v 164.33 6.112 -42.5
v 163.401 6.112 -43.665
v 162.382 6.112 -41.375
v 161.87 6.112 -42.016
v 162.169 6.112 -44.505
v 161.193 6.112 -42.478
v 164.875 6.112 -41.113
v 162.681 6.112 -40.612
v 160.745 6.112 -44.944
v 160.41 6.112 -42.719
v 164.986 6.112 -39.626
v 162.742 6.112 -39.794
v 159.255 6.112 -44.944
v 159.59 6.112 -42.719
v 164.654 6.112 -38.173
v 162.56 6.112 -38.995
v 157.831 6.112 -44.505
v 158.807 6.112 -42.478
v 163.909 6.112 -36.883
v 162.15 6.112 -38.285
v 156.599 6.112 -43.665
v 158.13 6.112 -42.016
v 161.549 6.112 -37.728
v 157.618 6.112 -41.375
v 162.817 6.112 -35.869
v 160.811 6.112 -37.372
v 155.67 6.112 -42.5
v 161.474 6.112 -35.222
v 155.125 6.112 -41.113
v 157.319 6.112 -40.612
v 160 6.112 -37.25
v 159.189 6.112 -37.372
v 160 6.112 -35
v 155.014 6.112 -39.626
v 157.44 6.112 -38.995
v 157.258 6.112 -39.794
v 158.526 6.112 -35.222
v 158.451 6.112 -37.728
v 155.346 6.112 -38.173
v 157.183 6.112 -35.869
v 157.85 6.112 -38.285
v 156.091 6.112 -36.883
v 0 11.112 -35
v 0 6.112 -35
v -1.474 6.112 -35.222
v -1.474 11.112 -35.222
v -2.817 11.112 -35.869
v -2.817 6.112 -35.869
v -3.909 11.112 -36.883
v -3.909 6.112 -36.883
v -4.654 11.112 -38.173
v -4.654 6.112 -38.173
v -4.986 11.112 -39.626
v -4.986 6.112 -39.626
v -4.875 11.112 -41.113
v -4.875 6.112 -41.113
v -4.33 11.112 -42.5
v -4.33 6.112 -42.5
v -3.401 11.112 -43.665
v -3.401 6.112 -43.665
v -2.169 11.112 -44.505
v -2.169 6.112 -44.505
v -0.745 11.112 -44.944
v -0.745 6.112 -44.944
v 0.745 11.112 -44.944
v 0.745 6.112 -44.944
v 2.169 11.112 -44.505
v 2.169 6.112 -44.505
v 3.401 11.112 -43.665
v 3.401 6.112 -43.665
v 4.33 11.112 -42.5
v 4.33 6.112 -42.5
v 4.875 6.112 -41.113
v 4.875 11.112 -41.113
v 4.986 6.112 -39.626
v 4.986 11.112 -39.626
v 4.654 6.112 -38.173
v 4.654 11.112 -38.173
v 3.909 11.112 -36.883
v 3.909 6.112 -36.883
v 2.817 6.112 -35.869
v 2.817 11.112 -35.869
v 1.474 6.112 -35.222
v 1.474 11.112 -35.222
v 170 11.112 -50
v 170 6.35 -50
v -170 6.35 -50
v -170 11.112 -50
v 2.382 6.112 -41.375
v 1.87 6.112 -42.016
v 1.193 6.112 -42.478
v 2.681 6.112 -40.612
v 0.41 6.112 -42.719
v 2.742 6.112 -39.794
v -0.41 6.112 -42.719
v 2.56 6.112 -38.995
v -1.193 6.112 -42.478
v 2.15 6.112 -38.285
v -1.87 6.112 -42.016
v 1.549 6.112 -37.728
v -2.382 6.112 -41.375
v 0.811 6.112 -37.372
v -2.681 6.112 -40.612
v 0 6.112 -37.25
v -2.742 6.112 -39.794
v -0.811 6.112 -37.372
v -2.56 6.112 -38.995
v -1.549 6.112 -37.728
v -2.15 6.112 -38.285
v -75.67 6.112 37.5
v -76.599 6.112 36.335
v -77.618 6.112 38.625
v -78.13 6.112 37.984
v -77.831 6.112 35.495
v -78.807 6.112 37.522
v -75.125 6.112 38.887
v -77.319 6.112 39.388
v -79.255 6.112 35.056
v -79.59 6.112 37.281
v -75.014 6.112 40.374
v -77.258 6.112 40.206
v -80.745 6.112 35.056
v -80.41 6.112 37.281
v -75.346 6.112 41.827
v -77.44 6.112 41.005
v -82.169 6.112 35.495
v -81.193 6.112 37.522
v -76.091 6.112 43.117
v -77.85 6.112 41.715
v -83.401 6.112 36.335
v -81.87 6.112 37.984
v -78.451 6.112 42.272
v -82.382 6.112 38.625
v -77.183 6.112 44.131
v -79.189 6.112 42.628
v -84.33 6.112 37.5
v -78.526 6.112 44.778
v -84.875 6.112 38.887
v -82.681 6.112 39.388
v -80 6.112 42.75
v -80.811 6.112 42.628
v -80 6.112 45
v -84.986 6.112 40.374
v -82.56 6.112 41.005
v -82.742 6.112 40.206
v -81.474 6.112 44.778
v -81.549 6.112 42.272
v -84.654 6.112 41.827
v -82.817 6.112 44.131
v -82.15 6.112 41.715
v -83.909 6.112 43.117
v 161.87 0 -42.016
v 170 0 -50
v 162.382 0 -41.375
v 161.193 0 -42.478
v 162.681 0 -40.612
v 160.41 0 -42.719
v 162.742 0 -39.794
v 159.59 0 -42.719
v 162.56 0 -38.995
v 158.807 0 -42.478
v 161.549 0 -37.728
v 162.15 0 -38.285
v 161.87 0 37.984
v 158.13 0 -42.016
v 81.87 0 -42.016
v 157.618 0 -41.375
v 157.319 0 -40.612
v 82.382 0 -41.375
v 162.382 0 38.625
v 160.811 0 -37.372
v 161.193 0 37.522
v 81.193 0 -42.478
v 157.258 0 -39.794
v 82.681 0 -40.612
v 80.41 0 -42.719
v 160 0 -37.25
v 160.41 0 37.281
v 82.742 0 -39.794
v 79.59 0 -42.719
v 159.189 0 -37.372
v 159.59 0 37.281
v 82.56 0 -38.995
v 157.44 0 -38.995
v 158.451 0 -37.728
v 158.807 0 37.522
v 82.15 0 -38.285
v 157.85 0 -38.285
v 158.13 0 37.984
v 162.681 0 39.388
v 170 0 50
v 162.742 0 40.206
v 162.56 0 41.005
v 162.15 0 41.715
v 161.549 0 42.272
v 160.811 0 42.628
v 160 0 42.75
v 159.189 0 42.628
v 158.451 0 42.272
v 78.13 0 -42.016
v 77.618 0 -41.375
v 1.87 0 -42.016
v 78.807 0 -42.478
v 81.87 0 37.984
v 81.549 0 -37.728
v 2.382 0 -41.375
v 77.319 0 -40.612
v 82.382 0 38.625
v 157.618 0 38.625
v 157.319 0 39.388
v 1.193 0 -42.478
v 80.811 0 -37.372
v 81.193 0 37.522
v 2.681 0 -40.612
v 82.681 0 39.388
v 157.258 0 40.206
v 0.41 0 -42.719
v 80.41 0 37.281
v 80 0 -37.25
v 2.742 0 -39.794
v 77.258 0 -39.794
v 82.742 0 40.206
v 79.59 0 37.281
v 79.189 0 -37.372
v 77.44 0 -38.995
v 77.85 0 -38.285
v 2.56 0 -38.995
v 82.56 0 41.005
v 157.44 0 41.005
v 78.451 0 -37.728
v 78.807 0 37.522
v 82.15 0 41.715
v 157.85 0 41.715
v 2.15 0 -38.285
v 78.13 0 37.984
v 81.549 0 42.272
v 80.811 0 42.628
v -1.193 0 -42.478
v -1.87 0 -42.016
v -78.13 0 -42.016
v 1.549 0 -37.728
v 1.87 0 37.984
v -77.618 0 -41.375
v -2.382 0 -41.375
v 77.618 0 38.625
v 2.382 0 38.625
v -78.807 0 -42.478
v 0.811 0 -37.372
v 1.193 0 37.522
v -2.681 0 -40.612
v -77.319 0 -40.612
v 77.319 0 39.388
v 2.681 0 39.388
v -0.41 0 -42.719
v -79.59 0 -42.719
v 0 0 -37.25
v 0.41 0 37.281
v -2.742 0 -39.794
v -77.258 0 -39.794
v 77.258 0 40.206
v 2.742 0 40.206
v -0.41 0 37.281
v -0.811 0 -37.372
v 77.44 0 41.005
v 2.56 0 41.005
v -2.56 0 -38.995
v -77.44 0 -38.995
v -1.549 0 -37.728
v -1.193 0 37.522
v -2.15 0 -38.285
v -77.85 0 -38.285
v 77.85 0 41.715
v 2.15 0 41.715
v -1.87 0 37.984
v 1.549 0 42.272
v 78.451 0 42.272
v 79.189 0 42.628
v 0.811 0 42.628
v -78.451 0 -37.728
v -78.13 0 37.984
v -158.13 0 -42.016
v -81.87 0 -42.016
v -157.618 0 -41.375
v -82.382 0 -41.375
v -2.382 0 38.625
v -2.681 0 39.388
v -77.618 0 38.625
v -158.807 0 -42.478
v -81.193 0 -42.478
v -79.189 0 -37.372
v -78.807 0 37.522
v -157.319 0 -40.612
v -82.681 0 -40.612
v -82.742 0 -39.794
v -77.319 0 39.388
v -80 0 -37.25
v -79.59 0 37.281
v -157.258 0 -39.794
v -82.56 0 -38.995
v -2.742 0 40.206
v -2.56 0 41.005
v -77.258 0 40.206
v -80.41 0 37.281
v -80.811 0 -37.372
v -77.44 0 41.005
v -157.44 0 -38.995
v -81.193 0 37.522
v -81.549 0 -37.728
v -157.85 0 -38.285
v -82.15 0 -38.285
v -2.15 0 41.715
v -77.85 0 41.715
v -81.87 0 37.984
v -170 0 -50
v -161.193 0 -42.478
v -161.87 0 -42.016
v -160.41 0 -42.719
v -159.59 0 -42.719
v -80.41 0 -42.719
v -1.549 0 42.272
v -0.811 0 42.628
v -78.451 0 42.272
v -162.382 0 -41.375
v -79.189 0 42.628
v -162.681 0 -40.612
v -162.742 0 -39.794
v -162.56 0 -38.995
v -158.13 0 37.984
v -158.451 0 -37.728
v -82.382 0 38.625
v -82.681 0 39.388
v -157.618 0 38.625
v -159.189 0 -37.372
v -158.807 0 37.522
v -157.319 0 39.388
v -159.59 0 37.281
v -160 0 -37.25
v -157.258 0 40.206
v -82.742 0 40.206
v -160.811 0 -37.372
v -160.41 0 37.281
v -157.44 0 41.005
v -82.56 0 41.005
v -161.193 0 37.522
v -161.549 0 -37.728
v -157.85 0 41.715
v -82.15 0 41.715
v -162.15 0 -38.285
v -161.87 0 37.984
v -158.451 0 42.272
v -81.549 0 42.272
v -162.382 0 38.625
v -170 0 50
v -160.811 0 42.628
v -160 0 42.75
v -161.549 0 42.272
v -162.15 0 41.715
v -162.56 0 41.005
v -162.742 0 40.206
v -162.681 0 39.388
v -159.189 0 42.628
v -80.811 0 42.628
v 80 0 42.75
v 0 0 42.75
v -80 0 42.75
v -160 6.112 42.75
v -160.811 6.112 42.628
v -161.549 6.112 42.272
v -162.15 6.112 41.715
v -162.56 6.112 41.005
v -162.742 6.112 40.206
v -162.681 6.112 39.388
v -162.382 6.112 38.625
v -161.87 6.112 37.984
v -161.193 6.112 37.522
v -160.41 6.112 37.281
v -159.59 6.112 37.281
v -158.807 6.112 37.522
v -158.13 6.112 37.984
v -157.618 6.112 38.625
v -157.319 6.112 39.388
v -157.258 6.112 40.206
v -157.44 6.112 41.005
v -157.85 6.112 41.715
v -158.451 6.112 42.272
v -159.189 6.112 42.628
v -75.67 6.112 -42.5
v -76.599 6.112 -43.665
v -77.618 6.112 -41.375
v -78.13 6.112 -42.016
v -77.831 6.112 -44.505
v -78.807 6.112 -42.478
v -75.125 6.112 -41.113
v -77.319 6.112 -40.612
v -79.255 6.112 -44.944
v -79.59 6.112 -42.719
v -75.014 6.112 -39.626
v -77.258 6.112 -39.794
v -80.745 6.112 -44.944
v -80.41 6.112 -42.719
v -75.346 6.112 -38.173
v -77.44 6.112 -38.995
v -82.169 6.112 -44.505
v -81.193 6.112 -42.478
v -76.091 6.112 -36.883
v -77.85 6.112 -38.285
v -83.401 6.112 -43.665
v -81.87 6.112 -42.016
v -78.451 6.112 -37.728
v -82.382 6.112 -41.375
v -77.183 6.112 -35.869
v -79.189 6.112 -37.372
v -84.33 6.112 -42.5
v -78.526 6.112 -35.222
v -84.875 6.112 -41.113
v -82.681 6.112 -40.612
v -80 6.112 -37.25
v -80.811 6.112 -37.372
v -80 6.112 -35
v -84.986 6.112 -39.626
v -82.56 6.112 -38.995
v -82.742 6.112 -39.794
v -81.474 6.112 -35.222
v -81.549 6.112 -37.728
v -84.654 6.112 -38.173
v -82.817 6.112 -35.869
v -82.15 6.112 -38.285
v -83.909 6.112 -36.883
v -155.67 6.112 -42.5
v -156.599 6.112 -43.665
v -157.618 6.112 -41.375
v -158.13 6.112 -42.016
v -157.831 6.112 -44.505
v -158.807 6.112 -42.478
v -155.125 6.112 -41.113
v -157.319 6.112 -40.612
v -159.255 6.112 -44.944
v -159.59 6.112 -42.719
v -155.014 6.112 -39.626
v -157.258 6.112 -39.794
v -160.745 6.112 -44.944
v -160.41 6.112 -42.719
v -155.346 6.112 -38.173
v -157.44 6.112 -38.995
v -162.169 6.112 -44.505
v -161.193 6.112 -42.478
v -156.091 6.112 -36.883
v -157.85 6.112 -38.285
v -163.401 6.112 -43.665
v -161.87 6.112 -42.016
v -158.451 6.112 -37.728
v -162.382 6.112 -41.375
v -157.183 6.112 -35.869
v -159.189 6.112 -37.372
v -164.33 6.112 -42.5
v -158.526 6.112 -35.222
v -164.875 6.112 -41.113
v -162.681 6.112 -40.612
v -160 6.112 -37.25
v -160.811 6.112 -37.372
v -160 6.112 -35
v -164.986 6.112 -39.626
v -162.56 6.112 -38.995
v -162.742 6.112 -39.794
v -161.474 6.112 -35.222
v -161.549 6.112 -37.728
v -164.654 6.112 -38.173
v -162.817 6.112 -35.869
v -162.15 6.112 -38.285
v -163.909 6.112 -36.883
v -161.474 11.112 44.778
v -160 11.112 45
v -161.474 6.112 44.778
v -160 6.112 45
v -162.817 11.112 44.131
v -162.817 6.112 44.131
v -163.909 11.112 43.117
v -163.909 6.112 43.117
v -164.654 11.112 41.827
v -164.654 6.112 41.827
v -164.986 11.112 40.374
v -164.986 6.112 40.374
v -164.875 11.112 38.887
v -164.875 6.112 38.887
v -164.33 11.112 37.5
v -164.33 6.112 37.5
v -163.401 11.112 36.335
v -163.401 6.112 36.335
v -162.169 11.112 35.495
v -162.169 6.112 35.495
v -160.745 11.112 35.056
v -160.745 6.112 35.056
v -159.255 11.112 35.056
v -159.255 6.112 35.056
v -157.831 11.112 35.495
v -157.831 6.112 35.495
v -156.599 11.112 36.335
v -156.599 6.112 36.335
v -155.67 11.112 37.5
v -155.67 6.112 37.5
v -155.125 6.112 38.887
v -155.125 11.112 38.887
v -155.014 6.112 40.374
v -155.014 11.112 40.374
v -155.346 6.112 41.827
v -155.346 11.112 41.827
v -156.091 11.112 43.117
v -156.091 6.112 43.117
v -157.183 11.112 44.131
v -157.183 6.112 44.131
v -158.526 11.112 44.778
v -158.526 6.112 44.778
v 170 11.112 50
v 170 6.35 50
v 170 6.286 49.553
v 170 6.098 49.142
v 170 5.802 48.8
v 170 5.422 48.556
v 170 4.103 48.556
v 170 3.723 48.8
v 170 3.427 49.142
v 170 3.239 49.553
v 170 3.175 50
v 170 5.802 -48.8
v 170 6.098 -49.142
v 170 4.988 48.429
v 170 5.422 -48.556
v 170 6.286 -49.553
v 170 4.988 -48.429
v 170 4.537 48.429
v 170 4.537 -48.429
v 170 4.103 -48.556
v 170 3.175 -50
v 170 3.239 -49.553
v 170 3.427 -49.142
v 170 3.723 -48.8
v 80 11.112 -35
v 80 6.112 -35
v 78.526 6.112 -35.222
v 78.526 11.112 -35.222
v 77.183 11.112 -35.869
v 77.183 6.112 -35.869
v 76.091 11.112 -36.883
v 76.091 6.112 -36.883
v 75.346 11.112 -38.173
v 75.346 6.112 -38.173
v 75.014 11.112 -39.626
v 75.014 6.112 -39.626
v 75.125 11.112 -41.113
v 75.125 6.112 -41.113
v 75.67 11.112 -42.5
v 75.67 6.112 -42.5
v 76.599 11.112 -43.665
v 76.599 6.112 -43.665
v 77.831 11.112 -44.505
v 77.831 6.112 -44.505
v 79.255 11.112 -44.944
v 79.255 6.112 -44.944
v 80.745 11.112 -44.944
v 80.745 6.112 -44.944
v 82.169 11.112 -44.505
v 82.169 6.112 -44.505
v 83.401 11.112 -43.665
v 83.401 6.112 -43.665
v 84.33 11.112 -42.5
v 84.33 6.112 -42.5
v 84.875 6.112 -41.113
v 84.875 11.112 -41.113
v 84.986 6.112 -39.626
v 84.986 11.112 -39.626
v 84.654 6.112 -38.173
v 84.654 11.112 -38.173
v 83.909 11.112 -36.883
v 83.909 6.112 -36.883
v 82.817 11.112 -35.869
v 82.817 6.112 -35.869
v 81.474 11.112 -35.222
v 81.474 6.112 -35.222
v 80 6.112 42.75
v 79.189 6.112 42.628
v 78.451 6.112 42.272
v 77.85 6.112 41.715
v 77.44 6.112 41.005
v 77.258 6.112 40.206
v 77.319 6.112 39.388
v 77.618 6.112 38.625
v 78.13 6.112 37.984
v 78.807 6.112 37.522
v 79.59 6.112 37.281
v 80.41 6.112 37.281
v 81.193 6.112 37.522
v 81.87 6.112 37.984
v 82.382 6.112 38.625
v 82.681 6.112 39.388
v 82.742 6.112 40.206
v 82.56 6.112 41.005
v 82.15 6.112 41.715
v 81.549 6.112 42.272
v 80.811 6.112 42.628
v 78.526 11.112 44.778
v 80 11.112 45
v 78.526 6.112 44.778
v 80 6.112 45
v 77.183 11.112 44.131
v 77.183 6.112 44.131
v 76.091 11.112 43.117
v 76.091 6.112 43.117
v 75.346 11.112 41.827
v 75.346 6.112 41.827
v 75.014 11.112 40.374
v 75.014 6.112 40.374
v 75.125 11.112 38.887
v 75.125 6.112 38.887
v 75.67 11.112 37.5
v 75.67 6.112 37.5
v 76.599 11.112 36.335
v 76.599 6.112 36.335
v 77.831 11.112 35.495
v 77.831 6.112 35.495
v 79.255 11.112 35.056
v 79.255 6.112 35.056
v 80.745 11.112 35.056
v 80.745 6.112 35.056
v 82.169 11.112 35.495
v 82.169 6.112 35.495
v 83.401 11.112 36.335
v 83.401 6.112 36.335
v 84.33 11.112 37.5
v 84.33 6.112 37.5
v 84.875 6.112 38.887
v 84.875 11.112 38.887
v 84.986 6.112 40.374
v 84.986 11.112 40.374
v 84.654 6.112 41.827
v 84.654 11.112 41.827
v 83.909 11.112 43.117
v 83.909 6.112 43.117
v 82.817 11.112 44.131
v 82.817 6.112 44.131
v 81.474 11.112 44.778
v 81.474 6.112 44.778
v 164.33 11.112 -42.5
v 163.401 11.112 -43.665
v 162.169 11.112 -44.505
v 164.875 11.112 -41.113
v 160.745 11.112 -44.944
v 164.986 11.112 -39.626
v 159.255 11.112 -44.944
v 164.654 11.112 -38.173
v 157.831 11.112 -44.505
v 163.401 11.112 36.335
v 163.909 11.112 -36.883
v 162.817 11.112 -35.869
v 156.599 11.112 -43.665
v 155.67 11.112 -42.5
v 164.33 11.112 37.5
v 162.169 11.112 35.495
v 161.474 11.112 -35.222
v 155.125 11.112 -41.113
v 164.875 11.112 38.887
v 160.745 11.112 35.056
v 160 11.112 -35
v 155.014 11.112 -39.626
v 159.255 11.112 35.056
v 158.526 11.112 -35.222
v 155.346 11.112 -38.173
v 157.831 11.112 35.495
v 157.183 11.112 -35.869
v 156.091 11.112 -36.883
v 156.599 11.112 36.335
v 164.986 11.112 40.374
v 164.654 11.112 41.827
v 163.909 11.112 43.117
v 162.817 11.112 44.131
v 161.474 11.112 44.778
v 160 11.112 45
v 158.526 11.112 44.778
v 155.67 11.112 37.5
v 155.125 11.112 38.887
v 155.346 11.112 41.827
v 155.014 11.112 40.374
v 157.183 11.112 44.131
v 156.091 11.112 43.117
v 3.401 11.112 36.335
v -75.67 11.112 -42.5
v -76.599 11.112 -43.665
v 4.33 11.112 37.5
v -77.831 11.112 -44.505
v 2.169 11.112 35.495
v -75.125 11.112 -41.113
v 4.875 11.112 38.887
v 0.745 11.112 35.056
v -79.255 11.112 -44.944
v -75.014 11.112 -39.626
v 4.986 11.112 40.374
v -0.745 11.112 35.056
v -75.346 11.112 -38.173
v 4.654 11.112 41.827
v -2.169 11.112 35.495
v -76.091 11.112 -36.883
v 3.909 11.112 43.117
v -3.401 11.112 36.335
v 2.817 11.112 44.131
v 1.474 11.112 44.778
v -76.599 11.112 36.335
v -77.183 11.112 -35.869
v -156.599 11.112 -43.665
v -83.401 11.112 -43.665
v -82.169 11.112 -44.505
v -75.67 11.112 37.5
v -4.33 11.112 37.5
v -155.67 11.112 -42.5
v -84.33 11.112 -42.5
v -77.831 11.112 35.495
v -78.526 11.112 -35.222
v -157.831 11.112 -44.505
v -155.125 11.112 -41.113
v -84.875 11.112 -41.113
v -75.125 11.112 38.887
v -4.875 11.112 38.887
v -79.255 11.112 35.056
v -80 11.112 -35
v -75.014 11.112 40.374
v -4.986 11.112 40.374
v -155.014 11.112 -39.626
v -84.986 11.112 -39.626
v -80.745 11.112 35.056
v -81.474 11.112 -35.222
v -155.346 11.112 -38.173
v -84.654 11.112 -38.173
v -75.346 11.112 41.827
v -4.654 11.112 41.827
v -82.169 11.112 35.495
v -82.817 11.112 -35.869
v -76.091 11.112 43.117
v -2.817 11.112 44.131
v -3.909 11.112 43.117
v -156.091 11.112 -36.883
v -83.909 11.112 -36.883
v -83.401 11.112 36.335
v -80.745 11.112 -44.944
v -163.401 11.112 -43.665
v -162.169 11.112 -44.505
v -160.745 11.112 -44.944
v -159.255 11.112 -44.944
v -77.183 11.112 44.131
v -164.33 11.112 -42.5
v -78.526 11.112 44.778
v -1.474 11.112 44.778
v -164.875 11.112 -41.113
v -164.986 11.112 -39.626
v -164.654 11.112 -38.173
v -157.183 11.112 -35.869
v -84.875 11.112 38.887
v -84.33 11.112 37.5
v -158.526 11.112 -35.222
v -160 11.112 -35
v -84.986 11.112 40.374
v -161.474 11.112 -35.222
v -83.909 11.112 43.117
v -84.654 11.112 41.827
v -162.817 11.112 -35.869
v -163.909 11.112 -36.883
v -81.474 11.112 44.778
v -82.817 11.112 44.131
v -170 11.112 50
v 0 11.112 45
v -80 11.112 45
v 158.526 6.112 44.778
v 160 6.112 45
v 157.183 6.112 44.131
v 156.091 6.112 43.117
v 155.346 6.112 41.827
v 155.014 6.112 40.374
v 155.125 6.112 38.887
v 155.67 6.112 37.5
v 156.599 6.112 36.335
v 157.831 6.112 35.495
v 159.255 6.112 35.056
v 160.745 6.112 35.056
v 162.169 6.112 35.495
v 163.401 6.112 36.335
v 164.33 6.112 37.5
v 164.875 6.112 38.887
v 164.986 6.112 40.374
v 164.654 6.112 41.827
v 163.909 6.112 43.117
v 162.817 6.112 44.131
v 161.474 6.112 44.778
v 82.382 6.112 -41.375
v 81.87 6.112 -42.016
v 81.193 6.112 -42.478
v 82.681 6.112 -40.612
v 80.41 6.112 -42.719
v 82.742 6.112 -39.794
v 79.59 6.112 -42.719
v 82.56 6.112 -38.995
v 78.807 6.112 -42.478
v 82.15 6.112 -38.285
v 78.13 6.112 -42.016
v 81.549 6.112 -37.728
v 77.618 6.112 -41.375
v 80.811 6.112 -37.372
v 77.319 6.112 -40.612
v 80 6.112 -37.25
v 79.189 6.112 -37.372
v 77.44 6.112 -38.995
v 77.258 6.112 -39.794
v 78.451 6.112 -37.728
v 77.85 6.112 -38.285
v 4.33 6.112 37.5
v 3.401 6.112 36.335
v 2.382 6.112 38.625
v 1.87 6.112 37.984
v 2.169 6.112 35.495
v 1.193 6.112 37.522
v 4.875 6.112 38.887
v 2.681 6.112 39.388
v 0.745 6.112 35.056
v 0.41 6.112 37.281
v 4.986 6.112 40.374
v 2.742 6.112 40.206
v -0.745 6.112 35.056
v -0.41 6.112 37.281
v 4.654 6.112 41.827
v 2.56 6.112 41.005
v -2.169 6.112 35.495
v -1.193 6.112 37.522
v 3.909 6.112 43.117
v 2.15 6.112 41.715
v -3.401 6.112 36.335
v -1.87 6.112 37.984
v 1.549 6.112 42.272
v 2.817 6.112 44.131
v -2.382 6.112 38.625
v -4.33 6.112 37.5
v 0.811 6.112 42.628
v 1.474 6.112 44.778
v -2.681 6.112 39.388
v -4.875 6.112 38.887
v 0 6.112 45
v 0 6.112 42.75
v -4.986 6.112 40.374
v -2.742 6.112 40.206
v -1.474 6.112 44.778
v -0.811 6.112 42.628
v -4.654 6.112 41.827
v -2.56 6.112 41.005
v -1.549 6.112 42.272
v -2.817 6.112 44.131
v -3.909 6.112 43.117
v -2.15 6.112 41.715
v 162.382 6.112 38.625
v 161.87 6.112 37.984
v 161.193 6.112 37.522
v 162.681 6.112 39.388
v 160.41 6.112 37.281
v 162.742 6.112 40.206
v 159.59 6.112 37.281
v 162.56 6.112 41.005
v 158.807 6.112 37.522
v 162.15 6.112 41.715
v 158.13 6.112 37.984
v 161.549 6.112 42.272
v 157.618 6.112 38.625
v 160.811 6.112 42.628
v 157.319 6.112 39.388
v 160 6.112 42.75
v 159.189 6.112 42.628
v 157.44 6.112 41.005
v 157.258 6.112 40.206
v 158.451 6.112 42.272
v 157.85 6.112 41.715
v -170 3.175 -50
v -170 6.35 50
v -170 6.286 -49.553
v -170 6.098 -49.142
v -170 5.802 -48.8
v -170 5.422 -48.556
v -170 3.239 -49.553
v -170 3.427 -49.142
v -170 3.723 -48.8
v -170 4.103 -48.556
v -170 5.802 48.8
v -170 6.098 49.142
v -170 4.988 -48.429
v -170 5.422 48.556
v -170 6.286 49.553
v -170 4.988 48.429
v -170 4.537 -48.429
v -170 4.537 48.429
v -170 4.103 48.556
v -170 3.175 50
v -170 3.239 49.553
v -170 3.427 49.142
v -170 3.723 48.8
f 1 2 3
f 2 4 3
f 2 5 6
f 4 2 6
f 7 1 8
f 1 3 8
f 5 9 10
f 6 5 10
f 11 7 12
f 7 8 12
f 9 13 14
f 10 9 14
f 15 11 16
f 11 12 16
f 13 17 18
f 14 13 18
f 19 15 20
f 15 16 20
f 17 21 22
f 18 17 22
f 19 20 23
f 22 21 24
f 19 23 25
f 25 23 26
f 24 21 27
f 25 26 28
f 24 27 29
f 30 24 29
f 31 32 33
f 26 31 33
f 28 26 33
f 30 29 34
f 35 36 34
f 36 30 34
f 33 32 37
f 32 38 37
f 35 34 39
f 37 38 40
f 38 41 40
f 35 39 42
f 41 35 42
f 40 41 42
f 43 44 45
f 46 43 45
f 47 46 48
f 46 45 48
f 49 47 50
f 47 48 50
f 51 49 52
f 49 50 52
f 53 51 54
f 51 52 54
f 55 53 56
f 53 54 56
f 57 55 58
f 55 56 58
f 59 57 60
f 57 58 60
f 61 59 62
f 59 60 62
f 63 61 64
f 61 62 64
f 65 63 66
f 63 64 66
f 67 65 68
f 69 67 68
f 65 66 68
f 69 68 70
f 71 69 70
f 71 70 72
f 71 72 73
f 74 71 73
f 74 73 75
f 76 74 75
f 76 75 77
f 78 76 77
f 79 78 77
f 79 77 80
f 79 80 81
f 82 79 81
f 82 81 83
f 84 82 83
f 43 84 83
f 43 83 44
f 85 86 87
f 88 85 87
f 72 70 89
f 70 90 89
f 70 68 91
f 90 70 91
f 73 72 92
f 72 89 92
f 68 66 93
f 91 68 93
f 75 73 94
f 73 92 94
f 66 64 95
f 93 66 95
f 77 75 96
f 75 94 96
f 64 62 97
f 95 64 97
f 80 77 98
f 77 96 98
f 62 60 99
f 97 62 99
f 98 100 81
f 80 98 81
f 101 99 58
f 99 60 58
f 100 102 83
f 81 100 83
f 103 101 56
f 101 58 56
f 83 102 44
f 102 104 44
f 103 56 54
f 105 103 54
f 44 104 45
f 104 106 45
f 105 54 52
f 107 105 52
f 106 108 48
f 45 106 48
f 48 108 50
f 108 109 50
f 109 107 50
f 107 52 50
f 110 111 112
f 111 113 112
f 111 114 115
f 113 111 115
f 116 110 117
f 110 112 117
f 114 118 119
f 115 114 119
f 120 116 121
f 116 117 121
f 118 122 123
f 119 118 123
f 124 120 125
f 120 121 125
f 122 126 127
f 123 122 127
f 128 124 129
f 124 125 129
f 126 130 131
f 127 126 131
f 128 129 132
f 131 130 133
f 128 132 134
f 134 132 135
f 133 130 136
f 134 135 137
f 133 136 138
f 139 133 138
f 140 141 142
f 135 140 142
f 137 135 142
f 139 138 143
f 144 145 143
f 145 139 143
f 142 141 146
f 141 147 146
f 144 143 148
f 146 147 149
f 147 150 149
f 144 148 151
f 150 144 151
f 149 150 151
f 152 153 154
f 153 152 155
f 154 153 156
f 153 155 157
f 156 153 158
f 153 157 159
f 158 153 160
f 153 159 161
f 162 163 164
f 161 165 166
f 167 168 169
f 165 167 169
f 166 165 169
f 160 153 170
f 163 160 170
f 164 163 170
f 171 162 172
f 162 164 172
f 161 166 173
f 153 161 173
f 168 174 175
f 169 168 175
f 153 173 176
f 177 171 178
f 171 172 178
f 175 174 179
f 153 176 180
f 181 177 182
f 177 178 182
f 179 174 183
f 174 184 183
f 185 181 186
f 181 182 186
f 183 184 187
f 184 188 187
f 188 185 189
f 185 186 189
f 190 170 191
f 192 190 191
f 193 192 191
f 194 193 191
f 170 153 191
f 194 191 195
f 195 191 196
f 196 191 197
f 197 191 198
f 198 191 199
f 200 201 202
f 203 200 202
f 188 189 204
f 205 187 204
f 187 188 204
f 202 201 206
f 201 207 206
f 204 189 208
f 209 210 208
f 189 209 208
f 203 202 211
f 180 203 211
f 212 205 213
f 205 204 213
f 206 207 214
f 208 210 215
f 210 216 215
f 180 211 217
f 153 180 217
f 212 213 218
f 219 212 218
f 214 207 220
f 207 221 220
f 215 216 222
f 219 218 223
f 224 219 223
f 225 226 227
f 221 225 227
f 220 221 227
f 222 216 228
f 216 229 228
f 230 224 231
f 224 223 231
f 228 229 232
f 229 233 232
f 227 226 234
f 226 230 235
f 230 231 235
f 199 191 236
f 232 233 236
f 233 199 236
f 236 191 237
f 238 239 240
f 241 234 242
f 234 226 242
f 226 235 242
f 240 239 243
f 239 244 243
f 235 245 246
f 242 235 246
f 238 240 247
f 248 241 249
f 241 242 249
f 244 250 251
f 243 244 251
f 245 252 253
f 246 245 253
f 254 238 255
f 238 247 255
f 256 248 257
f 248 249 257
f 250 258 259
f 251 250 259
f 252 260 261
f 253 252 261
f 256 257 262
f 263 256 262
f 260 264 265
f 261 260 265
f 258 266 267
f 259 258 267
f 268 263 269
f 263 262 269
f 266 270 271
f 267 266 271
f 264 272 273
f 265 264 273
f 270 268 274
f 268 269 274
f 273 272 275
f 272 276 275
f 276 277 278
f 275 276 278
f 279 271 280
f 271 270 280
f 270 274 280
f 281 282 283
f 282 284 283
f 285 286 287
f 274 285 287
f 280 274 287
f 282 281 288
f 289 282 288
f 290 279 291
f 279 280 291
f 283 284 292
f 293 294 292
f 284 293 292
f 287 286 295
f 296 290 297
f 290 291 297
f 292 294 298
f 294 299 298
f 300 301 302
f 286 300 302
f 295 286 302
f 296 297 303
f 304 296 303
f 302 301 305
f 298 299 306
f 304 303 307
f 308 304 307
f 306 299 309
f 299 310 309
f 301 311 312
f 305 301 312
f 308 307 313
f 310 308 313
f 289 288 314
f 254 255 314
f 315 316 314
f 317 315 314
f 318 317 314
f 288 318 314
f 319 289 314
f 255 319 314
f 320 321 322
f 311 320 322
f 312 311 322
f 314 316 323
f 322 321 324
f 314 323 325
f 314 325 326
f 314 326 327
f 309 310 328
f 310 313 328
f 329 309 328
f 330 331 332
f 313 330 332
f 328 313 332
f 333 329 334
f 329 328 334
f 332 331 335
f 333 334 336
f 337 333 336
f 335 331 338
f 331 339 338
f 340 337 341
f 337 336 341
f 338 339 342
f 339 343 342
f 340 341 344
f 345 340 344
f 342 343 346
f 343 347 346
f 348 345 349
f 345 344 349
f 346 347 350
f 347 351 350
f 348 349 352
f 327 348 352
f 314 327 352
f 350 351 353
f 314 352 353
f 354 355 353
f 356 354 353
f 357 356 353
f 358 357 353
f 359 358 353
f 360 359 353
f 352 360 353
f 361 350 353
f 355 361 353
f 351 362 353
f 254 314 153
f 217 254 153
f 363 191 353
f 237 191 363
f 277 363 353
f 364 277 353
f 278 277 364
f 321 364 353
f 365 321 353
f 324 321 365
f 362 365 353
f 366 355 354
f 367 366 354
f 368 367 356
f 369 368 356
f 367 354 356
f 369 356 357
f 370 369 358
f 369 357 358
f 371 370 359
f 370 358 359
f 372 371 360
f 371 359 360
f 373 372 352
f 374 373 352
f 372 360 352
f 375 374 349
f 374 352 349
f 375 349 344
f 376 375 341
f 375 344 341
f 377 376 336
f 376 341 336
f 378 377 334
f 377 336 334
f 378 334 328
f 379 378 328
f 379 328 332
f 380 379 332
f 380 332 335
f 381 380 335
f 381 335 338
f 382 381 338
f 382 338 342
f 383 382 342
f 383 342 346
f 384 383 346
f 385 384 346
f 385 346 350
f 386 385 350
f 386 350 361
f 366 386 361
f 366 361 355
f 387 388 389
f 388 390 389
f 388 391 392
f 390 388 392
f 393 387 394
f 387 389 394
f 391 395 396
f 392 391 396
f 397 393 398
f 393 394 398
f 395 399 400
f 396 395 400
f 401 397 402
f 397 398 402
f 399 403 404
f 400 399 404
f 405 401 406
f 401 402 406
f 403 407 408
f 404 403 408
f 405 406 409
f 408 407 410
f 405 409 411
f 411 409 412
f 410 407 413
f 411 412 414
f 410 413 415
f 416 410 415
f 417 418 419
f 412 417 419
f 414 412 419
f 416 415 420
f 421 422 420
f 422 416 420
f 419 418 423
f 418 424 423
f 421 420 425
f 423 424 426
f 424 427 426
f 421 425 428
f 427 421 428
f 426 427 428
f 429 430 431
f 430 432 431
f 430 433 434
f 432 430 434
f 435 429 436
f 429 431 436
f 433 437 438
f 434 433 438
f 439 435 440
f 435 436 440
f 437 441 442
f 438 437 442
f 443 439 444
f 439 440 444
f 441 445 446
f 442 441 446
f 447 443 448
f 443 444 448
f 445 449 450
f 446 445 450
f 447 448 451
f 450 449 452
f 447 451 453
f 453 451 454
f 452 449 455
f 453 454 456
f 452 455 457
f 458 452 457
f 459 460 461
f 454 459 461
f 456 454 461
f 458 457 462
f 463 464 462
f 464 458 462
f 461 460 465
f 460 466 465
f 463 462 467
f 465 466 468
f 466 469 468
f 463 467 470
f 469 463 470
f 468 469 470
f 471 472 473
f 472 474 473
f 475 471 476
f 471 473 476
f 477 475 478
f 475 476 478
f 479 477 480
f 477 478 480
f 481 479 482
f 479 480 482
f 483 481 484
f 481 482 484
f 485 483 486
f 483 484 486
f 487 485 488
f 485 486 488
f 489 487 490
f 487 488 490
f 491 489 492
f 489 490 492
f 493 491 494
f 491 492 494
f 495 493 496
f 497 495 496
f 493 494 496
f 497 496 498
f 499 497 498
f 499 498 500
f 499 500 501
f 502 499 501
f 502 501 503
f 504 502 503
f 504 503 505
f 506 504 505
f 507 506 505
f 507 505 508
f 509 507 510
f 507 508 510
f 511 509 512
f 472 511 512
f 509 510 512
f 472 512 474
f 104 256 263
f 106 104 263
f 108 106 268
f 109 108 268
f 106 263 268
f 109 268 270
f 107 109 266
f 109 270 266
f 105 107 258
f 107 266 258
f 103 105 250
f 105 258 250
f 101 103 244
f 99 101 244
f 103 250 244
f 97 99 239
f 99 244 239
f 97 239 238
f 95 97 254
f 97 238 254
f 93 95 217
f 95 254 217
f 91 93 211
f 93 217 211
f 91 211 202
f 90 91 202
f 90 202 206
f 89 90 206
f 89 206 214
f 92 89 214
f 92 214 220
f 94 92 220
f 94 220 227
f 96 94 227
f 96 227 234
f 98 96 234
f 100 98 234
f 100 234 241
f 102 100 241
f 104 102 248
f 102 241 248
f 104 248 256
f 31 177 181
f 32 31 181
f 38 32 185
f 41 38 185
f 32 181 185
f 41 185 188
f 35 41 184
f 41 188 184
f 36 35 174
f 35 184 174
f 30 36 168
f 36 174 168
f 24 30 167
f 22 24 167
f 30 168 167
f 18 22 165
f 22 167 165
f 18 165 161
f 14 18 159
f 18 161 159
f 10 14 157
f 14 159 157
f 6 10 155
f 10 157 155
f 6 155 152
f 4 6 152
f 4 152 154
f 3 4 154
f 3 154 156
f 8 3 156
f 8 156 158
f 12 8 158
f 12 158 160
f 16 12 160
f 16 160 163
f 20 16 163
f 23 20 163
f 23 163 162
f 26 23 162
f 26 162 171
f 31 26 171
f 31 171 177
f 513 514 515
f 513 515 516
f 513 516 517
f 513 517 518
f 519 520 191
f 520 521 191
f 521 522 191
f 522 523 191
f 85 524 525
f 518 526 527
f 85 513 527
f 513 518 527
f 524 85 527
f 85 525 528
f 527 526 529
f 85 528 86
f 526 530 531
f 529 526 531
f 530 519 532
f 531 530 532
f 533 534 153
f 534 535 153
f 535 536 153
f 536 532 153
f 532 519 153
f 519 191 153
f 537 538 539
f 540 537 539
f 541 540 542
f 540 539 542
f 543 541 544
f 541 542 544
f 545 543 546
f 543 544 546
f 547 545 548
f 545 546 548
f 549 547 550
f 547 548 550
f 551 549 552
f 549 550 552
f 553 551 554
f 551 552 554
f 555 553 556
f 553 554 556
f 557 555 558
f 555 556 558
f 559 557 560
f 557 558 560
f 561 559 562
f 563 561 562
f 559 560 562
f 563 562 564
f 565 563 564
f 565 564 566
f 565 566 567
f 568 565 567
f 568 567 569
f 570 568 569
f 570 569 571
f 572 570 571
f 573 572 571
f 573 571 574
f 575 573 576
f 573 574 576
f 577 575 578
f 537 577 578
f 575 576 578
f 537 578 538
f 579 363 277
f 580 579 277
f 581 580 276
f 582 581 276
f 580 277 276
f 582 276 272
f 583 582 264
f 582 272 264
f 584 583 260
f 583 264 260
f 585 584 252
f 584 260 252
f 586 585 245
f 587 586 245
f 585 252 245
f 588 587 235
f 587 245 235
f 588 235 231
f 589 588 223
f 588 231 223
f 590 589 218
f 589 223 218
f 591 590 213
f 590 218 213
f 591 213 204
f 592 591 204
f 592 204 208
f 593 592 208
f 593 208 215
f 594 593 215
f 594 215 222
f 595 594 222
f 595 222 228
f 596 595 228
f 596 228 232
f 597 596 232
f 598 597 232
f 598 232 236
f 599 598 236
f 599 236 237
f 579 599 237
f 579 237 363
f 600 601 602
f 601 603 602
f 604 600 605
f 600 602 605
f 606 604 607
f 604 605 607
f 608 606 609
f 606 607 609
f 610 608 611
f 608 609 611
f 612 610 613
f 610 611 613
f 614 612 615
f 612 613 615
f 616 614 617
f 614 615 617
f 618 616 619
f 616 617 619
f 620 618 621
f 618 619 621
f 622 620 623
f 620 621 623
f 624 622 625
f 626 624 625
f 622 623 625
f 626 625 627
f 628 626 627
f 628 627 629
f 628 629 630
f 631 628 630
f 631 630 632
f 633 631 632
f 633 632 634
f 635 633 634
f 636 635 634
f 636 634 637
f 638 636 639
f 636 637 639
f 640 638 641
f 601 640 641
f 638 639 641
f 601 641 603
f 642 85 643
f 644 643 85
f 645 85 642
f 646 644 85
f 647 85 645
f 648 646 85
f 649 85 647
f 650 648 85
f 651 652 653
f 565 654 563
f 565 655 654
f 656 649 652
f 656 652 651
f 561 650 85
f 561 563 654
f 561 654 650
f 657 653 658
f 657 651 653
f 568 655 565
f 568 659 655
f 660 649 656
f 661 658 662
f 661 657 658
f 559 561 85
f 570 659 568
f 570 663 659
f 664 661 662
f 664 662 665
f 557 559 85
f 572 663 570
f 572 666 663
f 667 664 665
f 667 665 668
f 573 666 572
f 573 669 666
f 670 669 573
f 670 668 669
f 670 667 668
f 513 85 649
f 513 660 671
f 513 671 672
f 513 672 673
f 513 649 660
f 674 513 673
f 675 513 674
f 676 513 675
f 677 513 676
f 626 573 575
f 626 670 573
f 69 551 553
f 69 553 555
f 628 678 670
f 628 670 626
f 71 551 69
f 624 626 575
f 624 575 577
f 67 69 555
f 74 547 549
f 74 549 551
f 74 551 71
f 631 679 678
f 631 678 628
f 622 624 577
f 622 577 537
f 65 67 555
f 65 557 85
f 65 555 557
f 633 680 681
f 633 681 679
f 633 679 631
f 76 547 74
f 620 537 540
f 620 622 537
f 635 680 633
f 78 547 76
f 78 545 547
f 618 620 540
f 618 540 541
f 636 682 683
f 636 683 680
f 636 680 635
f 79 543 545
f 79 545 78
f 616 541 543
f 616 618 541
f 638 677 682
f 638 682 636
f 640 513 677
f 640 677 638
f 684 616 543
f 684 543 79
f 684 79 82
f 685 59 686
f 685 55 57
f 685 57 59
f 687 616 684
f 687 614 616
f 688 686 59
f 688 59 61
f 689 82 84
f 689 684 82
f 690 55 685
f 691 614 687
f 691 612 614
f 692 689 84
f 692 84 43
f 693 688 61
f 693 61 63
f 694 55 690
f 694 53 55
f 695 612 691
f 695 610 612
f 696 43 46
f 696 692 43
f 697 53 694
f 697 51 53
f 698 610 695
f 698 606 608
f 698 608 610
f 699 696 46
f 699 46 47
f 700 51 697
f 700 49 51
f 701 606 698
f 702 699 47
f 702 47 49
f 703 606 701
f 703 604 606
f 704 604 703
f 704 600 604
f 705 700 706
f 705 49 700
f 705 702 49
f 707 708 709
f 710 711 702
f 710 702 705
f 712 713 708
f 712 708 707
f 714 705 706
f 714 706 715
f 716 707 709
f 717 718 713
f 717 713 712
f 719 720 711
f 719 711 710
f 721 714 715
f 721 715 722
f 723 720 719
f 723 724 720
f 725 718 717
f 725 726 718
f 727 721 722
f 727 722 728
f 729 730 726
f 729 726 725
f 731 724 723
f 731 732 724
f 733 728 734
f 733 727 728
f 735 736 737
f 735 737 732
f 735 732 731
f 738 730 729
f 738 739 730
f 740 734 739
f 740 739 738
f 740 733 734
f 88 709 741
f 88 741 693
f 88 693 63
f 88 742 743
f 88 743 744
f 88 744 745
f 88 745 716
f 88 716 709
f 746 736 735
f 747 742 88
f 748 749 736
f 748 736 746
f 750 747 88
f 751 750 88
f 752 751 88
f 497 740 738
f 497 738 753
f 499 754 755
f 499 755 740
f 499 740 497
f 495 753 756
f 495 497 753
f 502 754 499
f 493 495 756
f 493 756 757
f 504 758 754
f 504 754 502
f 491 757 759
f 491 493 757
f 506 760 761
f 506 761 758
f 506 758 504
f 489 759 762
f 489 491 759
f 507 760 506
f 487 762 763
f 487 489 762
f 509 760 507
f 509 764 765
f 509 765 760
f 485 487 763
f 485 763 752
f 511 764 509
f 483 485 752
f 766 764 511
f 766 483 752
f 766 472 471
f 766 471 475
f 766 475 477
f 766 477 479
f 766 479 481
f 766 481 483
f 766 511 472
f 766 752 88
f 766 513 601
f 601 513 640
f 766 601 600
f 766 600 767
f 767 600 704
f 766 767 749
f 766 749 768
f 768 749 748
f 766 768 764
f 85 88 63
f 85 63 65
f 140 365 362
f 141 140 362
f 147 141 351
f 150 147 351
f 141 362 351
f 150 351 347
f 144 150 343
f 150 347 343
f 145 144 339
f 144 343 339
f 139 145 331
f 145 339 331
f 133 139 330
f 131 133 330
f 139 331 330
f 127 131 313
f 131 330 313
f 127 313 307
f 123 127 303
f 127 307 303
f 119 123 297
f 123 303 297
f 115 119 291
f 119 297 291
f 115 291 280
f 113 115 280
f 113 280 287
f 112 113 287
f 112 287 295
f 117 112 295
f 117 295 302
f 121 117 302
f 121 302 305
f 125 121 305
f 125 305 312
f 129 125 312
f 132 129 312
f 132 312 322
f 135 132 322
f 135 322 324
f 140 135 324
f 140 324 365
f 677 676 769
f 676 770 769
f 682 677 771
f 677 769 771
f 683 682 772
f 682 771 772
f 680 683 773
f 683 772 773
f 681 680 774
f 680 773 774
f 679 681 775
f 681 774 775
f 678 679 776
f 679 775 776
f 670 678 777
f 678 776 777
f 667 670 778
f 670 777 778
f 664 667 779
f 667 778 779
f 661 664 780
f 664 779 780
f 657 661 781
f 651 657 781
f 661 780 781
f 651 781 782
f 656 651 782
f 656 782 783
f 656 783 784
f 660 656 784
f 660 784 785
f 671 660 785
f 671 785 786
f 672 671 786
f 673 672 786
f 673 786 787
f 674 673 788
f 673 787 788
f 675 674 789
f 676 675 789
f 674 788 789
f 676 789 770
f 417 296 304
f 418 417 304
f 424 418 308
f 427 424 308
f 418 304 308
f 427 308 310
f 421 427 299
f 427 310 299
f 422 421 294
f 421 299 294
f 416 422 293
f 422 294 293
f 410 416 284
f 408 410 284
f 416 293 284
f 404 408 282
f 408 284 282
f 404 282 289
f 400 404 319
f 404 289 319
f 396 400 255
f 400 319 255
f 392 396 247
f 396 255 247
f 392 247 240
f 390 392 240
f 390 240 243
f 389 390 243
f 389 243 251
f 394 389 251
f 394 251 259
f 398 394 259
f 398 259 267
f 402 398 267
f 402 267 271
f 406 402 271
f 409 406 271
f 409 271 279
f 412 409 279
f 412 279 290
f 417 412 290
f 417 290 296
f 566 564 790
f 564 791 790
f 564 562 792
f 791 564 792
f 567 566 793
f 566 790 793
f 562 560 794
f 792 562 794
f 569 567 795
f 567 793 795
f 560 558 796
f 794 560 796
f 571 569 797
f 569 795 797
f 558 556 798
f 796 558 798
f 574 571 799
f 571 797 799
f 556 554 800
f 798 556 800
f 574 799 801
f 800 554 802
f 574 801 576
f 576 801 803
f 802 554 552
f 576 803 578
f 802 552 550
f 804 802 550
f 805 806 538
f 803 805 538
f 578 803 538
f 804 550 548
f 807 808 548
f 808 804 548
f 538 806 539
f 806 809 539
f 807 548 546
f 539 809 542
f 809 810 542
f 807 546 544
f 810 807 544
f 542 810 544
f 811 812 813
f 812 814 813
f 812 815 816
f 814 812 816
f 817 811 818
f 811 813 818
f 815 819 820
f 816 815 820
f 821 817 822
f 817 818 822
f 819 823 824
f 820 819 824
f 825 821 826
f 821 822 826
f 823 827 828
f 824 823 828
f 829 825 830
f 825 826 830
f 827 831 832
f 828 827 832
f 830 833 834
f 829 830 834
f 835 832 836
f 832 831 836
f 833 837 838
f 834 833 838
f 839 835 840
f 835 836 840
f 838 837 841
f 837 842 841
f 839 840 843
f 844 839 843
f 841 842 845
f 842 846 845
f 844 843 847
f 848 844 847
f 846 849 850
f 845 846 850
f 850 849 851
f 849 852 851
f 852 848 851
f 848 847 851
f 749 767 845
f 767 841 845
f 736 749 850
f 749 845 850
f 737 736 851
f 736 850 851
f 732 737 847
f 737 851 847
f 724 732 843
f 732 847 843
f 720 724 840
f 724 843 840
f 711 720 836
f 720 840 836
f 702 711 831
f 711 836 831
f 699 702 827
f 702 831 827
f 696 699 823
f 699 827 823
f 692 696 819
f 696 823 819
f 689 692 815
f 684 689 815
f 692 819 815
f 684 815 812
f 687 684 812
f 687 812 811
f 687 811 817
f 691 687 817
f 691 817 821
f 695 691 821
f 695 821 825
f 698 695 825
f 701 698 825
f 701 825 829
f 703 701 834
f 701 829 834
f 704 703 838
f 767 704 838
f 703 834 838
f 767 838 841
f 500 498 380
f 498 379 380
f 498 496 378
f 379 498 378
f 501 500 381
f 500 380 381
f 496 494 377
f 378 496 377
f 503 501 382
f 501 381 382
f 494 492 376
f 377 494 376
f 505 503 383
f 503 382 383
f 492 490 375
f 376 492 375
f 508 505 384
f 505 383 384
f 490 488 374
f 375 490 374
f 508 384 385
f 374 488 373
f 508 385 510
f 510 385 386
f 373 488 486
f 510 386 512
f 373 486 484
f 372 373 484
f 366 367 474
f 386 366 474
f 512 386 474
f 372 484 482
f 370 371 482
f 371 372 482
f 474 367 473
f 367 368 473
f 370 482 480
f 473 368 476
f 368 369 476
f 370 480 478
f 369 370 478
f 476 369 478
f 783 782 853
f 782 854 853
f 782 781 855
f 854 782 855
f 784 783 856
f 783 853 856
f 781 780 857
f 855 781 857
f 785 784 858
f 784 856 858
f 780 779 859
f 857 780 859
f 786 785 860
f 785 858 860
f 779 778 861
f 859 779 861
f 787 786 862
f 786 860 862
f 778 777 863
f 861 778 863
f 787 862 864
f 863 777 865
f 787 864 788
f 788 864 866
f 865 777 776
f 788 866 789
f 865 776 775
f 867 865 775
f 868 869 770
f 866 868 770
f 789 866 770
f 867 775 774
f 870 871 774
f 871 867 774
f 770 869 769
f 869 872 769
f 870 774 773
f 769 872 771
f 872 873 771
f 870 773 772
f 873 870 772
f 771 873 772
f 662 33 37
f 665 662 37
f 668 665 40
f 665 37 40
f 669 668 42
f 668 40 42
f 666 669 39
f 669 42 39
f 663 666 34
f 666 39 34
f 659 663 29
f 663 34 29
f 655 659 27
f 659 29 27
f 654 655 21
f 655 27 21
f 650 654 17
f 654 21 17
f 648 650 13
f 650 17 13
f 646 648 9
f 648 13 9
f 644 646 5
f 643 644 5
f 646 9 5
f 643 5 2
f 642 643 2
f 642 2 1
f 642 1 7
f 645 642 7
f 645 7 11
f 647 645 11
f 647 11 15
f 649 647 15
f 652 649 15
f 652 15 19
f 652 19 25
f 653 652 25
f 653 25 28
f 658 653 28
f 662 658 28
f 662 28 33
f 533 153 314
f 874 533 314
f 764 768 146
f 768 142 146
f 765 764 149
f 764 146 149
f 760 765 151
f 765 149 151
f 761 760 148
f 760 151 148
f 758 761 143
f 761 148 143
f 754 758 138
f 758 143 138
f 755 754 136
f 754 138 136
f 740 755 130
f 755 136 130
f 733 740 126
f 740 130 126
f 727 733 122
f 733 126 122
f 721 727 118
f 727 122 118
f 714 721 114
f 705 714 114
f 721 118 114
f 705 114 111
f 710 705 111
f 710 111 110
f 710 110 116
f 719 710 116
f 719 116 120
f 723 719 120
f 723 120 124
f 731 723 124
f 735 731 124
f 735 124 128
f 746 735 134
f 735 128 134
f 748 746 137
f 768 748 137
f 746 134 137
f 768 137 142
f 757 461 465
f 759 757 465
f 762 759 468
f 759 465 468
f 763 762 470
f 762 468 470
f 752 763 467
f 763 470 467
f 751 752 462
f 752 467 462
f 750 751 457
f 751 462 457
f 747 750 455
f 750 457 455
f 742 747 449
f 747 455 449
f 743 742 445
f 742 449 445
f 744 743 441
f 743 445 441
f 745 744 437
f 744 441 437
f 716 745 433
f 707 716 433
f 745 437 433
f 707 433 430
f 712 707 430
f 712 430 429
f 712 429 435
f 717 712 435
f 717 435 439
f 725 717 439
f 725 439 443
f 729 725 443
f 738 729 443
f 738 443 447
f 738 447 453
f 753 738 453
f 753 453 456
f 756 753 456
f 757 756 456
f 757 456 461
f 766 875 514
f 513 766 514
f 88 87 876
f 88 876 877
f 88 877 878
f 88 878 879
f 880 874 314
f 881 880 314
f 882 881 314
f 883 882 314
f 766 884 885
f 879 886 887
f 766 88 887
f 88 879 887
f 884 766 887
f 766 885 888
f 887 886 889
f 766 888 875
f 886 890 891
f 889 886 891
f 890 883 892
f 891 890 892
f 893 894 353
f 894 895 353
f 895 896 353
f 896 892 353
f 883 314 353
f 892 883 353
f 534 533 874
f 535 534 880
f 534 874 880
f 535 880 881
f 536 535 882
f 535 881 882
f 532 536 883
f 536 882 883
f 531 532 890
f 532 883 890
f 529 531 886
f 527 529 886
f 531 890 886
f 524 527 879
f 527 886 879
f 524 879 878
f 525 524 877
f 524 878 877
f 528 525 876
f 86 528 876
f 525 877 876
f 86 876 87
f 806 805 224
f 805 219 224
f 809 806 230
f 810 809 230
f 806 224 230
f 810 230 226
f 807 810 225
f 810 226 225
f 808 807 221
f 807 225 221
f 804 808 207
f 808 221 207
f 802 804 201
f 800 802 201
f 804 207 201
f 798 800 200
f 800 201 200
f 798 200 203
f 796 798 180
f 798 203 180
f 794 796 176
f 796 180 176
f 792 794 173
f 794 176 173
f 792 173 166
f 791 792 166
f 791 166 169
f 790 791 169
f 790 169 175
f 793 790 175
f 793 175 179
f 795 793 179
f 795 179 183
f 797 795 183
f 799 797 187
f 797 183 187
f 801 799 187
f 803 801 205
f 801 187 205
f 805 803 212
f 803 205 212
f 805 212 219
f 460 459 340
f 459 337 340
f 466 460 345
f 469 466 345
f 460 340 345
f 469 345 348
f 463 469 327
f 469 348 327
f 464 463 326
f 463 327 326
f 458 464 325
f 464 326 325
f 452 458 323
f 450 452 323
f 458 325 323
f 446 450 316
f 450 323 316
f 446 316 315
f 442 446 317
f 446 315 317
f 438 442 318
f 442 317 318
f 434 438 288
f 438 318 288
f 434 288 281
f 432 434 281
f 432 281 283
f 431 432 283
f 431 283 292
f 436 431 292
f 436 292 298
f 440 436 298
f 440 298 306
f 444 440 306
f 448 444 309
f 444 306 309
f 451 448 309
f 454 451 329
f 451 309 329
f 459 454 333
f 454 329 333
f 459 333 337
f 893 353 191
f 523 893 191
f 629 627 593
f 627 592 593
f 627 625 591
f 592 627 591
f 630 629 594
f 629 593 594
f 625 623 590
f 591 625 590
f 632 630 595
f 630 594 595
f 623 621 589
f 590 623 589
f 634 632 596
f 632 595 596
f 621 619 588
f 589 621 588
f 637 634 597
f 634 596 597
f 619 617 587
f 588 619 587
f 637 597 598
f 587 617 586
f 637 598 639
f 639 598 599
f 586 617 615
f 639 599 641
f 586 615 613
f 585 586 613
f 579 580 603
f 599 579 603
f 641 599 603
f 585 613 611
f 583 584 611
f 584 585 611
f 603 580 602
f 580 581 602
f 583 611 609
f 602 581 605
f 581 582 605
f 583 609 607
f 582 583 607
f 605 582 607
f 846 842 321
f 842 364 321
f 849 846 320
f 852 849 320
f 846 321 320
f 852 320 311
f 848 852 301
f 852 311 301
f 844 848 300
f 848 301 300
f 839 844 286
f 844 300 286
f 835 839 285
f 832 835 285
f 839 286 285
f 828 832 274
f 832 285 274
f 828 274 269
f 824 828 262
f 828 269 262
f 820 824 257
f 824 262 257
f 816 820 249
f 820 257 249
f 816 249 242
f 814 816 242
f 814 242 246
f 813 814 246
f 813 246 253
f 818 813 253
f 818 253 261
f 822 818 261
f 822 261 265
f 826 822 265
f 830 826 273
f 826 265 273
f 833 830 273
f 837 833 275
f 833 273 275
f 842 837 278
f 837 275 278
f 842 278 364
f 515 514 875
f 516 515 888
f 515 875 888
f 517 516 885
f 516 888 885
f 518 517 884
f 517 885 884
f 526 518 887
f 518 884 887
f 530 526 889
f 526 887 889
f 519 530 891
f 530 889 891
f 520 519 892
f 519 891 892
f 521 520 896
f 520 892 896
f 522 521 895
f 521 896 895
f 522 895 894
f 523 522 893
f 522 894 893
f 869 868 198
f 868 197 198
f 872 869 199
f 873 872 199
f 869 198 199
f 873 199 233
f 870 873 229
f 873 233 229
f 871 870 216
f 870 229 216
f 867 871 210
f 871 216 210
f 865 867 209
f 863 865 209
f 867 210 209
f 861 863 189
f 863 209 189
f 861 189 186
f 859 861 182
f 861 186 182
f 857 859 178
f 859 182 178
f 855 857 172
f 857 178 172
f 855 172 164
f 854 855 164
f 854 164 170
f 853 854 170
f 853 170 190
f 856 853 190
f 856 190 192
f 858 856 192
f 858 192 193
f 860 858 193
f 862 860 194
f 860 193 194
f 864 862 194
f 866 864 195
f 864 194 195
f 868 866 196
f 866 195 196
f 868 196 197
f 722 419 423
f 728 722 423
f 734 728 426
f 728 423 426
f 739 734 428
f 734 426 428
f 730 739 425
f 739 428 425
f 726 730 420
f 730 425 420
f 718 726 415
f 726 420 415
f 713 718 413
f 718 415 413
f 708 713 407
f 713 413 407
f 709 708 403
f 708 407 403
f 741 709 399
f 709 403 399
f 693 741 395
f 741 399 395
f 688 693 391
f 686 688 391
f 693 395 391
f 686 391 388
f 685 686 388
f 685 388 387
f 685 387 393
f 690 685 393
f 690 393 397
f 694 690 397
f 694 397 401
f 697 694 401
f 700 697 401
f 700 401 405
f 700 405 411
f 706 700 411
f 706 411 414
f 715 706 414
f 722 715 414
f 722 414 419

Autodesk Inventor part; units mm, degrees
ref_plane "YZ Plane" through (0, 0, 0) normal (1, 0, 0) x (0, 1, 0)
ref_plane "XZ Plane" through (0, 0, 0) normal (0, 1, 0) x (-1, 0, 0)
ref_plane "XY Plane" through (0, 0, 0) normal (0, 0, 1) x (1, 0, 0)
sketch "Sketch1" plane through (0, 0, 0) normal (0, 1, 0) x (-1, 0, 0)
  line L0 (170, 50) -> (-170, 50)
  line L1 (-170, 50) -> (-170, -50)
  line L2 (-170, -50) -> (170, -50)
  line L3 (170, -50) -> (170, 50)
  line L4 (170, 50) -> (-170, -50) construction
  line L5 (-170, 50) -> (170, -50) construction
  point P0 (0, 0)
  dimension "d0" = 340
  dimension "d1" = 100
extrude "Extrusion1" add sketch "Sketch1" along normal blind 11.1125
sketch "Sketch2" plane through (0, 11.1125, 0) normal (0, 1, 0) x (1, 0, 0)
  line L0 (-170, -50) -> (170, -50) projected
  line L1 (170, -50) -> (170, 50) projected
  line L2 (170, 50) -> (-170, 50) projected
  line L3 (-170, 50) -> (-170, -50) projected
  point P0 (0, 0)
  point P1 (-160, -40)
  dimension "d4" = 10
  dimension "d5" = 10
hole "Hole1" at (-160, 11.1125, 40) direction (0, -1, 0) diameter 5.5 end through all counterbore diameter 10 counterbore depth 5 clearance for "Socket Head Cap Screw" size "M5" standard "Ansi Metric M Profile"
pattern_linear "Rectangular Pattern1" count 2 spacing 80 along (0, 0, -1) count 5 spacing 80 along (1, 0, 0) of "Hole1"
sketch "Sketch3" plane through (-170, 0, -50) normal (-1, 0, 0) x (0, 0, 1)
  line L0 (0, 0) -> (100, 0) projected
  line L1 (100, 0) -> (100, 11.1125) projected
  line L2 (0, 11.1125) -> (100, 11.1125) projected
  line L3 (0, 0) -> (0, 11.1125) projected
  line L4 (0, 0) -> (0, 11.1125) projected
  arc A0 (0, 3.175) -> (0, 6.35) centre (0, 4.7625) ccw
  point P0 (50, 0)
  dimension "d19" = 1.5875
  dimension "d20" = 6.35
extrude "oRingGroove" cut sketch "Sketch3" against normal through all contours L3 A0
mirror "Mirror1" about plane through (0, 0, 0) normal (0, 0, 1) of "oRingGroove"
equation "\"d1\" = depth"
equation "\"d2\" = facingThickness - facingGasketThickness"
equation "\"d19\" = 0.125 * facingThickness"
equation "\"d20\" = 0.5 * facingThickness"
equation "\"mppcMountThickness\" = 6.35"
equation "\"depth\" = 100"
equation "\"facingThickness\" = 12.7"
equation "\"facingGasketThickness\" = 1.5875"
properties part number "sideFace" material "Wood (Cherry)"
